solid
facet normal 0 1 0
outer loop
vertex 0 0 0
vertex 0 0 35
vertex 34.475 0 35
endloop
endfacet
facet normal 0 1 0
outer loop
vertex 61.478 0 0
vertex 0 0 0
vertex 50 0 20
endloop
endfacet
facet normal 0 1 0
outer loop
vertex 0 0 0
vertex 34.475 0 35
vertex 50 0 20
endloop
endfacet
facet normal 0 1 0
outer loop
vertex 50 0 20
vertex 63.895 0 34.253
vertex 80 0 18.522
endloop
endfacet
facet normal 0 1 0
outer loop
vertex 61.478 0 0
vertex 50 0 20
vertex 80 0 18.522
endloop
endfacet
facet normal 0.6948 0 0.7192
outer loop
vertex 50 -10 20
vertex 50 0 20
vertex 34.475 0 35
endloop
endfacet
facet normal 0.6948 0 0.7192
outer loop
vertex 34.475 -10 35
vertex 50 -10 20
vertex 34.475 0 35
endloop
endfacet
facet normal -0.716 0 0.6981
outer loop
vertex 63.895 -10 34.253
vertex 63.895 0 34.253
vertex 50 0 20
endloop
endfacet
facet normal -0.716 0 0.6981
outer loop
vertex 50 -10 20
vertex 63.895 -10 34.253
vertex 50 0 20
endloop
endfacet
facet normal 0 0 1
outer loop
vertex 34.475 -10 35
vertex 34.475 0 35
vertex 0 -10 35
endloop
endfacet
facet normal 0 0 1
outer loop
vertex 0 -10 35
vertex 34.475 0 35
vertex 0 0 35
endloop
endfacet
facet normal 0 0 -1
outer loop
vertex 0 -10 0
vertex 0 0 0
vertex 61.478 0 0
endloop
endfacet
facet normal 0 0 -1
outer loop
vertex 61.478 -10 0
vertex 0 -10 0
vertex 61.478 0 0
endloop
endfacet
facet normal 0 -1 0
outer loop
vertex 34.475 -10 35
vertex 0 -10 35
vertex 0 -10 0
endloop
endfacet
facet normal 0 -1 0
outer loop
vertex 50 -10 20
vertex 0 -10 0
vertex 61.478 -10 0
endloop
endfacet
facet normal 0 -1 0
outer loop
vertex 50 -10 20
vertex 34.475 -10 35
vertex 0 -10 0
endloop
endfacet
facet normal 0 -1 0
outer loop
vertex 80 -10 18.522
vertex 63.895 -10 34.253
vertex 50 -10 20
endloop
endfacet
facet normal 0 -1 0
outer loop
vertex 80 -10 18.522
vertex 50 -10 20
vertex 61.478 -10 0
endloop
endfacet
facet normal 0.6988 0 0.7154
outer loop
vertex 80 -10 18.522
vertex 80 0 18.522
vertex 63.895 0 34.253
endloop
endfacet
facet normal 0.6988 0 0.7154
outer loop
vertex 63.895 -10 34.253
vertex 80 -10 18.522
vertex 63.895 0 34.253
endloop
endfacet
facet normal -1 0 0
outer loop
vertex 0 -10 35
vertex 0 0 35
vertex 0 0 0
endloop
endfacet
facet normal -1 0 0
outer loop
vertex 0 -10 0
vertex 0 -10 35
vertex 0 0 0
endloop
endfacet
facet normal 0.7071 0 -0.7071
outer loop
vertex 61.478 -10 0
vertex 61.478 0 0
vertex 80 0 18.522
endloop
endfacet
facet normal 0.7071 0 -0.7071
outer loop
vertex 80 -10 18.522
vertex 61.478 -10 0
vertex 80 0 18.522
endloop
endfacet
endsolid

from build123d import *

# Parameters (mm, degrees)
F1_DEPTH = 10


with BuildPart() as f1:
    # F0 (on Front) → F1 (new body)
    with BuildSketch(Plane.XZ):
        Polygon((0, 35), (0, 0), (61.478138, 0), (80, 18.521862), (63.894674, 34.252785), (50, 20), (34.47455, 35), align=None)
    extrude(amount=F1_DEPTH)


solid = f1.part
